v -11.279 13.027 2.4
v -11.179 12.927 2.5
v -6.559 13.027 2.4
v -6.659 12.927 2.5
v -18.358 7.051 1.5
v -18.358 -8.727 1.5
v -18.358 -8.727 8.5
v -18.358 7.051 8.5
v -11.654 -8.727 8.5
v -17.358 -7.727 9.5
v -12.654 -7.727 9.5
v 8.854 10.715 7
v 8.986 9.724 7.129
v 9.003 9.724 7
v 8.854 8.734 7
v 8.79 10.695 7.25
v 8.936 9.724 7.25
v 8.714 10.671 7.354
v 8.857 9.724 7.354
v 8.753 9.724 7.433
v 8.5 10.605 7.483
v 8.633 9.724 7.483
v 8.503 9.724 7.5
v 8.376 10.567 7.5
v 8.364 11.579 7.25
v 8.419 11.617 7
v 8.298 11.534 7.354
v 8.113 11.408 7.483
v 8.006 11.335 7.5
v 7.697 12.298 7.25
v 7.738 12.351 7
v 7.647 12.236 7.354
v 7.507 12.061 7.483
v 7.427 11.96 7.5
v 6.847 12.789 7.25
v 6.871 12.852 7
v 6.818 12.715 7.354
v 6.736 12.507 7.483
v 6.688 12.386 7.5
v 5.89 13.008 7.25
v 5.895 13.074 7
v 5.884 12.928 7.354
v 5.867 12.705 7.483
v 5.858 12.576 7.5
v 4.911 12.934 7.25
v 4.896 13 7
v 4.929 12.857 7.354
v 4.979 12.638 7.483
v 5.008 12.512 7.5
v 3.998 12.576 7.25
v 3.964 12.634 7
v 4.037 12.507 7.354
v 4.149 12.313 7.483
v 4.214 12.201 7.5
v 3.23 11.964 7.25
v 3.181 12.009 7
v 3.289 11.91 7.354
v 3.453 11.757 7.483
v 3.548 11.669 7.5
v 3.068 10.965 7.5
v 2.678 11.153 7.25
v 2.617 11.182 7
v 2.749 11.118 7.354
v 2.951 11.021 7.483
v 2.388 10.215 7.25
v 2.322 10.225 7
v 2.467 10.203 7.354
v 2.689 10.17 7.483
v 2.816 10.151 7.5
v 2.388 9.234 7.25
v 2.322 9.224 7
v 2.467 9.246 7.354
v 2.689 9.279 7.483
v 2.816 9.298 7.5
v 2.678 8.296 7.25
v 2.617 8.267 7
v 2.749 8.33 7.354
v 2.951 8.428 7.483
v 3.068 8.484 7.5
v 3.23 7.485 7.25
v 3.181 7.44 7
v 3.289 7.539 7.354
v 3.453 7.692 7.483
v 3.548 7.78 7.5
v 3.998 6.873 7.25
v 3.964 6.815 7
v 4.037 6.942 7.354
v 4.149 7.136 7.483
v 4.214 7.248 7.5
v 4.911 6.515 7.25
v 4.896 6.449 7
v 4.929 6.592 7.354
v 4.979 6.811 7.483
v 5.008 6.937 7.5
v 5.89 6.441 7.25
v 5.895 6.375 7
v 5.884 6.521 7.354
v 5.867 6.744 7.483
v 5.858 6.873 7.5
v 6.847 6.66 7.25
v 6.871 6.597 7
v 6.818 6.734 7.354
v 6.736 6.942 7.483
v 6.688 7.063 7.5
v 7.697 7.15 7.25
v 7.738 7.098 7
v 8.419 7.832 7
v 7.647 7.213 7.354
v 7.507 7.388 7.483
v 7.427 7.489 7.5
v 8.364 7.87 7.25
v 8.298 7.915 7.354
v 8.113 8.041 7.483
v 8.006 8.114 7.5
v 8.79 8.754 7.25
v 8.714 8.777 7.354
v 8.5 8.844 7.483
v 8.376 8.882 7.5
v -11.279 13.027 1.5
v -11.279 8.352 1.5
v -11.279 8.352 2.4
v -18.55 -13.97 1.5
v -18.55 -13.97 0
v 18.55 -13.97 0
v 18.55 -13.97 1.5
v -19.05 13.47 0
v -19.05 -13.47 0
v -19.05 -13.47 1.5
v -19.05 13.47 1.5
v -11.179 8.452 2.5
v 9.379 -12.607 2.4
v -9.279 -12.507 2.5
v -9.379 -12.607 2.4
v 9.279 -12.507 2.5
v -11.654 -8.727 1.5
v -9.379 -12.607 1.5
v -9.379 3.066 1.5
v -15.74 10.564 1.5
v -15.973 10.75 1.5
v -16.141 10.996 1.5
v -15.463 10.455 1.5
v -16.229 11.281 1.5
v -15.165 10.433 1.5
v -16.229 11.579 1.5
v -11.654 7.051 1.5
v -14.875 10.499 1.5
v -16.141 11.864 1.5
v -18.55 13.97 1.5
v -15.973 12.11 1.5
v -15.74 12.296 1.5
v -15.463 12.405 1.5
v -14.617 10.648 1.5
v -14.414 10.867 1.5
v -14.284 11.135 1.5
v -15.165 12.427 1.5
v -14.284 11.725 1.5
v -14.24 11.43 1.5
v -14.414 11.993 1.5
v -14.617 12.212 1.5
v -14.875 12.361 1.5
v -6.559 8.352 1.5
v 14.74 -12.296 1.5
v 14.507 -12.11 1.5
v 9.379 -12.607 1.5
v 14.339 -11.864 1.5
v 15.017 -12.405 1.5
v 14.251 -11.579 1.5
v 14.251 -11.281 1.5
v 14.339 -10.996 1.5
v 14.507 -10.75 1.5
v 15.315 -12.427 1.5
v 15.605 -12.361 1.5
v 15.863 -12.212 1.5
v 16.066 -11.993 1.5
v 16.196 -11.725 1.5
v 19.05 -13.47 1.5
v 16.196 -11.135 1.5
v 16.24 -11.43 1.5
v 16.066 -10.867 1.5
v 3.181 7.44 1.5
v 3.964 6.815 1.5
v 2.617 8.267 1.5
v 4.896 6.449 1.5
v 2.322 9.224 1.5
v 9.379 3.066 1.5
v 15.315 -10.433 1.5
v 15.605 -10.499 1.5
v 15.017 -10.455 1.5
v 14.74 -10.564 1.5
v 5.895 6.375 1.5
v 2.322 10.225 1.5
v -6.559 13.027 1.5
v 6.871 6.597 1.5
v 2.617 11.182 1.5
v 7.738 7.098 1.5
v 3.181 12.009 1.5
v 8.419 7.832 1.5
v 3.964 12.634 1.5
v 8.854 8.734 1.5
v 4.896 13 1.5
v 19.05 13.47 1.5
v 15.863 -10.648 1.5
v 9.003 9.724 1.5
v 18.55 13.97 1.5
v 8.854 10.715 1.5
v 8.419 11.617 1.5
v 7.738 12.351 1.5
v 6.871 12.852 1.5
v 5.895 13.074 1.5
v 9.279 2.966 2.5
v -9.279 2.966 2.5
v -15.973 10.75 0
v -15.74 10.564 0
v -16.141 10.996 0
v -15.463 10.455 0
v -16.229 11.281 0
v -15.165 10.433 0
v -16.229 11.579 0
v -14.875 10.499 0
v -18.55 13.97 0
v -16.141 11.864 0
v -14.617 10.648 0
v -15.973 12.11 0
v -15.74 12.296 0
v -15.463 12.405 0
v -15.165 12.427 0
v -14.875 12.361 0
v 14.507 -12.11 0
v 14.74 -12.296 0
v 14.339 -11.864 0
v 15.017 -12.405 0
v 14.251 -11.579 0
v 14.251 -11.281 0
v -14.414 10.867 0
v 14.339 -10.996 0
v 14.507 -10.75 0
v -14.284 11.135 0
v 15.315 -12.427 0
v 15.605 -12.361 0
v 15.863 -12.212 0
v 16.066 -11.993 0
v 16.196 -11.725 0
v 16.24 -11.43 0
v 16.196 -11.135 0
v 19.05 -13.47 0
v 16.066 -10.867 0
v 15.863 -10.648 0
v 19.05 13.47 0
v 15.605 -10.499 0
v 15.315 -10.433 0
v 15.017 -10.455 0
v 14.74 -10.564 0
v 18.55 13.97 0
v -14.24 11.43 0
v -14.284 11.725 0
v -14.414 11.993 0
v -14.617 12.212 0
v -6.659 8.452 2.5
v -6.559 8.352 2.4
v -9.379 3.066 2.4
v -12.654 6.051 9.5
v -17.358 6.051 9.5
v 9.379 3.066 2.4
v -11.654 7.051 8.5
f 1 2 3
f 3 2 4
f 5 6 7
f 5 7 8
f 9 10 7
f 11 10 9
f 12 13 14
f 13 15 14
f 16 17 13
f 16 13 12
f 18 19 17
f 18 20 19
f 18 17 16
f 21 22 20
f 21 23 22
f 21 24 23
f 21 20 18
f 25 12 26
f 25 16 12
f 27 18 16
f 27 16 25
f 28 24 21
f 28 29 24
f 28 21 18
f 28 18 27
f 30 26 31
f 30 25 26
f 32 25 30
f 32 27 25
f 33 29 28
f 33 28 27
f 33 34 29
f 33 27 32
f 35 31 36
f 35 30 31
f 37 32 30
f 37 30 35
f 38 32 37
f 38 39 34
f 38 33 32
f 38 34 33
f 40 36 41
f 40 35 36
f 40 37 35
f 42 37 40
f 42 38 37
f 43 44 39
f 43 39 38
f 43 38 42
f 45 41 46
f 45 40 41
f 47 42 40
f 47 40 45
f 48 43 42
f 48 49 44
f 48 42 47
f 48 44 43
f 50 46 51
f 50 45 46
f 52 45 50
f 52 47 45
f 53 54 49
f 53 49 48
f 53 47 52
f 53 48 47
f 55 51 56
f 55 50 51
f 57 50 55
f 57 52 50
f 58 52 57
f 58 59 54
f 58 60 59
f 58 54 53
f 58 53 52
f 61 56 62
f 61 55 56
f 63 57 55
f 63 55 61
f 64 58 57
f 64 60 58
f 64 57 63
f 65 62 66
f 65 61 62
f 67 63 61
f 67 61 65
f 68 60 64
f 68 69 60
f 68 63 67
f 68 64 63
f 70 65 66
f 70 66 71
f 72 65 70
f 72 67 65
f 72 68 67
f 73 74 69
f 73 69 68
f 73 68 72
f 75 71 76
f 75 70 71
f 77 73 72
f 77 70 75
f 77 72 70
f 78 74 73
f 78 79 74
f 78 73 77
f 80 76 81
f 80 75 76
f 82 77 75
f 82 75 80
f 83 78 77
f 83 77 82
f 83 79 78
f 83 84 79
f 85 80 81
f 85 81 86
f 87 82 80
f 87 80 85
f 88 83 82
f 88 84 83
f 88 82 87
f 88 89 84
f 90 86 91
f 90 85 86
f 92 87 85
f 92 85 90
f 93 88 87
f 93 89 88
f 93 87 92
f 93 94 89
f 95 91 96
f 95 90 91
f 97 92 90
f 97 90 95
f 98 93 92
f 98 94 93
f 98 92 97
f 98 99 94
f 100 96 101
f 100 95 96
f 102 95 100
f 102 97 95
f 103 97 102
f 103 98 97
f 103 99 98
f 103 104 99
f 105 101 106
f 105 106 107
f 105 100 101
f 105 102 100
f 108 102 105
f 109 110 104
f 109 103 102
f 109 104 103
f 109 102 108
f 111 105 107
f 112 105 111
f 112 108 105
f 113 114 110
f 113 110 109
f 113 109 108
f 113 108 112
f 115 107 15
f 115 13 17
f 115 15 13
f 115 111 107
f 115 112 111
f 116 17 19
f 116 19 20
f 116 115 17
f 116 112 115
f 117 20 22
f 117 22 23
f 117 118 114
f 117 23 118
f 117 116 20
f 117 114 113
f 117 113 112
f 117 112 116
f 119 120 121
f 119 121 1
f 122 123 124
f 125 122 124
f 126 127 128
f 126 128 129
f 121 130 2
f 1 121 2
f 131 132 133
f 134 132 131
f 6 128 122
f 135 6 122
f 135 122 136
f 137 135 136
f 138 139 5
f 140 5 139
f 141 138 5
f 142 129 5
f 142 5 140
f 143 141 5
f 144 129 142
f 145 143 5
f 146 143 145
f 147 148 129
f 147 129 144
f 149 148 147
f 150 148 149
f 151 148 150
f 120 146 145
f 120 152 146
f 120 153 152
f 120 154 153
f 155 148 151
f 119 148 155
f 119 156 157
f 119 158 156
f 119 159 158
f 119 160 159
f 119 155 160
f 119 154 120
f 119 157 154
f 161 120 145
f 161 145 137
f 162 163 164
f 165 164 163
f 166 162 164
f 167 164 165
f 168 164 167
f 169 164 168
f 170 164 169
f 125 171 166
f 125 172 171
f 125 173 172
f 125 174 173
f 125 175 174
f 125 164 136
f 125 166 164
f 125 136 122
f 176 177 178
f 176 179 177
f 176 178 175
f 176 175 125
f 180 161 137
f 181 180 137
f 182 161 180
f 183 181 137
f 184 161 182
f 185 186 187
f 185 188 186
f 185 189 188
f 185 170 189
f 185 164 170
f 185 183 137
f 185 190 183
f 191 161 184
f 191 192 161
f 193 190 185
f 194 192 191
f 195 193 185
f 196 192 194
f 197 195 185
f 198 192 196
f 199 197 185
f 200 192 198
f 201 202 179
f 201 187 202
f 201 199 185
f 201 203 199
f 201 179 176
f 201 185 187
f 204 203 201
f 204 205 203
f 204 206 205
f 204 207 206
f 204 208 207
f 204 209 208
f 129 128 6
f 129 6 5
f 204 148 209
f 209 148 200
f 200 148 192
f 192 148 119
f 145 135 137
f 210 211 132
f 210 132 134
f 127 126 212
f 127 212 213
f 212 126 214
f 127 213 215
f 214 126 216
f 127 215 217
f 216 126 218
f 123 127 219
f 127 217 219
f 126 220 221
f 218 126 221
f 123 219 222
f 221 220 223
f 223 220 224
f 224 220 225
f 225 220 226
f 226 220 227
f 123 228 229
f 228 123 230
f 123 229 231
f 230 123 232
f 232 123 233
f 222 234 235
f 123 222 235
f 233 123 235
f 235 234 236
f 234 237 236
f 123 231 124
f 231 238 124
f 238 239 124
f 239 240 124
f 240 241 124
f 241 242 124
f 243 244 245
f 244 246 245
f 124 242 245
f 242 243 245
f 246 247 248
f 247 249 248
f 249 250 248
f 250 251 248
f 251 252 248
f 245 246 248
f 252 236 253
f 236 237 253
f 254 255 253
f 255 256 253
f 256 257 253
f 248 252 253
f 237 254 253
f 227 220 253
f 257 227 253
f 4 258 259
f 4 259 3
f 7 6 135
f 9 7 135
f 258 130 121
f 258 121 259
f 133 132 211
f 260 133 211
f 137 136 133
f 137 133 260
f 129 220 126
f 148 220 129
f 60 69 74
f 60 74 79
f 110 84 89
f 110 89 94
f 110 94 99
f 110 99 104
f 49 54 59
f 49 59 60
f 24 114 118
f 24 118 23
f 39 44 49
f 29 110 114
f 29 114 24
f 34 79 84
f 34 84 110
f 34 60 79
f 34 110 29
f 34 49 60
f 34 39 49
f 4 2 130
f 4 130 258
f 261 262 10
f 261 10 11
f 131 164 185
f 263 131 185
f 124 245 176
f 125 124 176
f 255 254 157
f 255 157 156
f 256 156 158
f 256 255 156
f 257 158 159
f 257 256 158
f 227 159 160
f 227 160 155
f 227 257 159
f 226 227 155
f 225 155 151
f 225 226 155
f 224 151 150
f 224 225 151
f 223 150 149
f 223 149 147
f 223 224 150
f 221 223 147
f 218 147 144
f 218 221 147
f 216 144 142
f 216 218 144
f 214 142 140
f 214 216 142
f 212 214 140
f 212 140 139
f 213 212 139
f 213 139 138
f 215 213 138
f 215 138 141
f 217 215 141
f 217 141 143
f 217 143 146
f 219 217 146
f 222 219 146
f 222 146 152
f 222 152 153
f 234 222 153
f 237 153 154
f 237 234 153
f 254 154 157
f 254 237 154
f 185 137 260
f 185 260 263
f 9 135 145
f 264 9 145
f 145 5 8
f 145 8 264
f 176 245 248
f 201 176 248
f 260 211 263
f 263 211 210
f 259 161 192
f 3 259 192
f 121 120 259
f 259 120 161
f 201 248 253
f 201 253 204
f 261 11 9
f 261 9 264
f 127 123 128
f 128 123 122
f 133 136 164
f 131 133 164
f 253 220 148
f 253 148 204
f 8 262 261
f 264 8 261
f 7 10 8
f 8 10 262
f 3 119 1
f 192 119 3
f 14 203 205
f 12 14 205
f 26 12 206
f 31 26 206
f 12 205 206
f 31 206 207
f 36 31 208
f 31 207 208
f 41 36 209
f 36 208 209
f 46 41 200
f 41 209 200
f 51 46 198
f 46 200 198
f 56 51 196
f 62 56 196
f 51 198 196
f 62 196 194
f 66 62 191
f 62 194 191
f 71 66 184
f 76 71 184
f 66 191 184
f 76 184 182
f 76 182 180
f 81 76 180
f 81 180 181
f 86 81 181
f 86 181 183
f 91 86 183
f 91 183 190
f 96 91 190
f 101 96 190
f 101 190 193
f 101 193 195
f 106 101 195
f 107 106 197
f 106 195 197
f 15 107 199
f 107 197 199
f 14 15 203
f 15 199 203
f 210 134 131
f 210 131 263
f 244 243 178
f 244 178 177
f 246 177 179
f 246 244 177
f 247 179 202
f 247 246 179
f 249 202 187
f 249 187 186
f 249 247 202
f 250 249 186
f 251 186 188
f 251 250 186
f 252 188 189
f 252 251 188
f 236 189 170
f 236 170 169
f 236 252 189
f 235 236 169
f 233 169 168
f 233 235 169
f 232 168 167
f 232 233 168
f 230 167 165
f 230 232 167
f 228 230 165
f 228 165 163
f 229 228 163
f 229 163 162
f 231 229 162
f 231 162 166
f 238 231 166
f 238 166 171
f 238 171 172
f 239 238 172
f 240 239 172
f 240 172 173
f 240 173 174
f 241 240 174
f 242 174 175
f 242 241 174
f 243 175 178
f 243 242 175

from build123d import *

# Parameters (mm, degrees)
SKETCH1_W           = 38.1
SKETCH1_H           = 27.94
SKETCH1_R           = 1
BOSS_EXTRUDE1_DEPTH = 1.5
CHAMFER1_SIZE       = 0.5
SKETCH2_W           = 18.758650548
SKETCH2_H           = 15.672811931
SKETCH2_W_2         = 4.719693546
SKETCH2_H_2         = 4.674063521
BOSS_EXTRUDE2_DEPTH = 1
SKETCH3_R           = 3.359281079
BOSS_EXTRUDE3_DEPTH = 6
CHAMFER2_SIZE       = 0.1
FILLET1_R           = 0.5
SKETCH4_W           = 6.703460486
SKETCH4_H           = 15.777656998
BOSS_EXTRUDE4_DEPTH = 8
CHAMFER3_SIZE       = 1


with BuildPart() as part:
    # Sketch1 → Boss-Extrude1 (new body)
    with BuildSketch(Plane.XY):
        Rectangle(SKETCH1_W, SKETCH1_H)
        with Locations((-15.24, 11.43)):
            Circle(SKETCH1_R, mode=Mode.SUBTRACT)
        with Locations((15.24, -11.43)):
            Circle(SKETCH1_R, mode=Mode.SUBTRACT)
    extrude(amount=BOSS_EXTRUDE1_DEPTH)

    # Chamfer1
    chamfer1_edges = [part.edges().sort_by_distance(p)[0] for p in [
        (-19.05, 13.97, 0.75),
        (19.05, 13.97, 0.75),
        (19.05, -13.97, 0.75),
        (-19.05, -13.97, 0.75),
    ]]
    chamfer(chamfer1_edges, length=CHAMFER1_SIZE)

    # Sketch2 → Boss-Extrude2 (add)
    with BuildSketch(Plane.XY.offset(1.5)):
        with Locations((0, -4.770868917)):
            Rectangle(SKETCH2_W, SKETCH2_H)
        with Locations((-8.919164238, 10.689497539)):
            Rectangle(SKETCH2_W_2, SKETCH2_H_2)
    extrude(amount=BOSS_EXTRUDE2_DEPTH)

    # Sketch3 → Boss-Extrude3 (add)
    with BuildSketch(Plane.XY.offset(1.5)):
        with Locations((5.64383642, 9.724451962)):
            Circle(SKETCH3_R)
    extrude(amount=BOSS_EXTRUDE3_DEPTH)

    # Chamfer2
    chamfer2_edges = [part.edges().sort_by_distance(p)[0] for p in [
        (-9.379325274, -4.770868917, 2.5),
        (0, -12.607274882, 2.5),
        (9.379325274, -4.770868917, 2.5),
        (0, 3.065537049, 2.5),
        (-6.559317465, 10.68949754, 2.5),
        (-8.919164238, 13.0265293, 2.5),
        (-11.279011011, 10.68949754, 2.5),
        (-8.919164238, 8.352465779, 2.5),
    ]]
    chamfer(chamfer2_edges, length=CHAMFER2_SIZE)

    # Fillet1
    fillet1_edges = [part.edges().sort_by_distance(p)[0] for p in [
        (2.284555342, 9.724451962, 7.5),
    ]]
    fillet(fillet1_edges, radius=FILLET1_R)

    # Sketch4 → Boss-Extrude4 (add)
    with BuildSketch(Plane.XY.offset(1.5)):
        with Locations((-15.005849453, -0.837932561)):
            Rectangle(SKETCH4_W, SKETCH4_H)
    extrude(amount=BOSS_EXTRUDE4_DEPTH)

    # Chamfer3
    chamfer3_edges = [part.edges().sort_by_distance(p)[0] for p in [
        (-11.65411921, -0.837932561, 9.5),
        (-15.005849453, 7.050895938, 9.5),
        (-18.357579696, -0.837932561, 9.5),
        (-15.005849453, -8.72676106, 9.5),
    ]]
    chamfer(chamfer3_edges, length=CHAMFER3_SIZE)


solid = part.part
